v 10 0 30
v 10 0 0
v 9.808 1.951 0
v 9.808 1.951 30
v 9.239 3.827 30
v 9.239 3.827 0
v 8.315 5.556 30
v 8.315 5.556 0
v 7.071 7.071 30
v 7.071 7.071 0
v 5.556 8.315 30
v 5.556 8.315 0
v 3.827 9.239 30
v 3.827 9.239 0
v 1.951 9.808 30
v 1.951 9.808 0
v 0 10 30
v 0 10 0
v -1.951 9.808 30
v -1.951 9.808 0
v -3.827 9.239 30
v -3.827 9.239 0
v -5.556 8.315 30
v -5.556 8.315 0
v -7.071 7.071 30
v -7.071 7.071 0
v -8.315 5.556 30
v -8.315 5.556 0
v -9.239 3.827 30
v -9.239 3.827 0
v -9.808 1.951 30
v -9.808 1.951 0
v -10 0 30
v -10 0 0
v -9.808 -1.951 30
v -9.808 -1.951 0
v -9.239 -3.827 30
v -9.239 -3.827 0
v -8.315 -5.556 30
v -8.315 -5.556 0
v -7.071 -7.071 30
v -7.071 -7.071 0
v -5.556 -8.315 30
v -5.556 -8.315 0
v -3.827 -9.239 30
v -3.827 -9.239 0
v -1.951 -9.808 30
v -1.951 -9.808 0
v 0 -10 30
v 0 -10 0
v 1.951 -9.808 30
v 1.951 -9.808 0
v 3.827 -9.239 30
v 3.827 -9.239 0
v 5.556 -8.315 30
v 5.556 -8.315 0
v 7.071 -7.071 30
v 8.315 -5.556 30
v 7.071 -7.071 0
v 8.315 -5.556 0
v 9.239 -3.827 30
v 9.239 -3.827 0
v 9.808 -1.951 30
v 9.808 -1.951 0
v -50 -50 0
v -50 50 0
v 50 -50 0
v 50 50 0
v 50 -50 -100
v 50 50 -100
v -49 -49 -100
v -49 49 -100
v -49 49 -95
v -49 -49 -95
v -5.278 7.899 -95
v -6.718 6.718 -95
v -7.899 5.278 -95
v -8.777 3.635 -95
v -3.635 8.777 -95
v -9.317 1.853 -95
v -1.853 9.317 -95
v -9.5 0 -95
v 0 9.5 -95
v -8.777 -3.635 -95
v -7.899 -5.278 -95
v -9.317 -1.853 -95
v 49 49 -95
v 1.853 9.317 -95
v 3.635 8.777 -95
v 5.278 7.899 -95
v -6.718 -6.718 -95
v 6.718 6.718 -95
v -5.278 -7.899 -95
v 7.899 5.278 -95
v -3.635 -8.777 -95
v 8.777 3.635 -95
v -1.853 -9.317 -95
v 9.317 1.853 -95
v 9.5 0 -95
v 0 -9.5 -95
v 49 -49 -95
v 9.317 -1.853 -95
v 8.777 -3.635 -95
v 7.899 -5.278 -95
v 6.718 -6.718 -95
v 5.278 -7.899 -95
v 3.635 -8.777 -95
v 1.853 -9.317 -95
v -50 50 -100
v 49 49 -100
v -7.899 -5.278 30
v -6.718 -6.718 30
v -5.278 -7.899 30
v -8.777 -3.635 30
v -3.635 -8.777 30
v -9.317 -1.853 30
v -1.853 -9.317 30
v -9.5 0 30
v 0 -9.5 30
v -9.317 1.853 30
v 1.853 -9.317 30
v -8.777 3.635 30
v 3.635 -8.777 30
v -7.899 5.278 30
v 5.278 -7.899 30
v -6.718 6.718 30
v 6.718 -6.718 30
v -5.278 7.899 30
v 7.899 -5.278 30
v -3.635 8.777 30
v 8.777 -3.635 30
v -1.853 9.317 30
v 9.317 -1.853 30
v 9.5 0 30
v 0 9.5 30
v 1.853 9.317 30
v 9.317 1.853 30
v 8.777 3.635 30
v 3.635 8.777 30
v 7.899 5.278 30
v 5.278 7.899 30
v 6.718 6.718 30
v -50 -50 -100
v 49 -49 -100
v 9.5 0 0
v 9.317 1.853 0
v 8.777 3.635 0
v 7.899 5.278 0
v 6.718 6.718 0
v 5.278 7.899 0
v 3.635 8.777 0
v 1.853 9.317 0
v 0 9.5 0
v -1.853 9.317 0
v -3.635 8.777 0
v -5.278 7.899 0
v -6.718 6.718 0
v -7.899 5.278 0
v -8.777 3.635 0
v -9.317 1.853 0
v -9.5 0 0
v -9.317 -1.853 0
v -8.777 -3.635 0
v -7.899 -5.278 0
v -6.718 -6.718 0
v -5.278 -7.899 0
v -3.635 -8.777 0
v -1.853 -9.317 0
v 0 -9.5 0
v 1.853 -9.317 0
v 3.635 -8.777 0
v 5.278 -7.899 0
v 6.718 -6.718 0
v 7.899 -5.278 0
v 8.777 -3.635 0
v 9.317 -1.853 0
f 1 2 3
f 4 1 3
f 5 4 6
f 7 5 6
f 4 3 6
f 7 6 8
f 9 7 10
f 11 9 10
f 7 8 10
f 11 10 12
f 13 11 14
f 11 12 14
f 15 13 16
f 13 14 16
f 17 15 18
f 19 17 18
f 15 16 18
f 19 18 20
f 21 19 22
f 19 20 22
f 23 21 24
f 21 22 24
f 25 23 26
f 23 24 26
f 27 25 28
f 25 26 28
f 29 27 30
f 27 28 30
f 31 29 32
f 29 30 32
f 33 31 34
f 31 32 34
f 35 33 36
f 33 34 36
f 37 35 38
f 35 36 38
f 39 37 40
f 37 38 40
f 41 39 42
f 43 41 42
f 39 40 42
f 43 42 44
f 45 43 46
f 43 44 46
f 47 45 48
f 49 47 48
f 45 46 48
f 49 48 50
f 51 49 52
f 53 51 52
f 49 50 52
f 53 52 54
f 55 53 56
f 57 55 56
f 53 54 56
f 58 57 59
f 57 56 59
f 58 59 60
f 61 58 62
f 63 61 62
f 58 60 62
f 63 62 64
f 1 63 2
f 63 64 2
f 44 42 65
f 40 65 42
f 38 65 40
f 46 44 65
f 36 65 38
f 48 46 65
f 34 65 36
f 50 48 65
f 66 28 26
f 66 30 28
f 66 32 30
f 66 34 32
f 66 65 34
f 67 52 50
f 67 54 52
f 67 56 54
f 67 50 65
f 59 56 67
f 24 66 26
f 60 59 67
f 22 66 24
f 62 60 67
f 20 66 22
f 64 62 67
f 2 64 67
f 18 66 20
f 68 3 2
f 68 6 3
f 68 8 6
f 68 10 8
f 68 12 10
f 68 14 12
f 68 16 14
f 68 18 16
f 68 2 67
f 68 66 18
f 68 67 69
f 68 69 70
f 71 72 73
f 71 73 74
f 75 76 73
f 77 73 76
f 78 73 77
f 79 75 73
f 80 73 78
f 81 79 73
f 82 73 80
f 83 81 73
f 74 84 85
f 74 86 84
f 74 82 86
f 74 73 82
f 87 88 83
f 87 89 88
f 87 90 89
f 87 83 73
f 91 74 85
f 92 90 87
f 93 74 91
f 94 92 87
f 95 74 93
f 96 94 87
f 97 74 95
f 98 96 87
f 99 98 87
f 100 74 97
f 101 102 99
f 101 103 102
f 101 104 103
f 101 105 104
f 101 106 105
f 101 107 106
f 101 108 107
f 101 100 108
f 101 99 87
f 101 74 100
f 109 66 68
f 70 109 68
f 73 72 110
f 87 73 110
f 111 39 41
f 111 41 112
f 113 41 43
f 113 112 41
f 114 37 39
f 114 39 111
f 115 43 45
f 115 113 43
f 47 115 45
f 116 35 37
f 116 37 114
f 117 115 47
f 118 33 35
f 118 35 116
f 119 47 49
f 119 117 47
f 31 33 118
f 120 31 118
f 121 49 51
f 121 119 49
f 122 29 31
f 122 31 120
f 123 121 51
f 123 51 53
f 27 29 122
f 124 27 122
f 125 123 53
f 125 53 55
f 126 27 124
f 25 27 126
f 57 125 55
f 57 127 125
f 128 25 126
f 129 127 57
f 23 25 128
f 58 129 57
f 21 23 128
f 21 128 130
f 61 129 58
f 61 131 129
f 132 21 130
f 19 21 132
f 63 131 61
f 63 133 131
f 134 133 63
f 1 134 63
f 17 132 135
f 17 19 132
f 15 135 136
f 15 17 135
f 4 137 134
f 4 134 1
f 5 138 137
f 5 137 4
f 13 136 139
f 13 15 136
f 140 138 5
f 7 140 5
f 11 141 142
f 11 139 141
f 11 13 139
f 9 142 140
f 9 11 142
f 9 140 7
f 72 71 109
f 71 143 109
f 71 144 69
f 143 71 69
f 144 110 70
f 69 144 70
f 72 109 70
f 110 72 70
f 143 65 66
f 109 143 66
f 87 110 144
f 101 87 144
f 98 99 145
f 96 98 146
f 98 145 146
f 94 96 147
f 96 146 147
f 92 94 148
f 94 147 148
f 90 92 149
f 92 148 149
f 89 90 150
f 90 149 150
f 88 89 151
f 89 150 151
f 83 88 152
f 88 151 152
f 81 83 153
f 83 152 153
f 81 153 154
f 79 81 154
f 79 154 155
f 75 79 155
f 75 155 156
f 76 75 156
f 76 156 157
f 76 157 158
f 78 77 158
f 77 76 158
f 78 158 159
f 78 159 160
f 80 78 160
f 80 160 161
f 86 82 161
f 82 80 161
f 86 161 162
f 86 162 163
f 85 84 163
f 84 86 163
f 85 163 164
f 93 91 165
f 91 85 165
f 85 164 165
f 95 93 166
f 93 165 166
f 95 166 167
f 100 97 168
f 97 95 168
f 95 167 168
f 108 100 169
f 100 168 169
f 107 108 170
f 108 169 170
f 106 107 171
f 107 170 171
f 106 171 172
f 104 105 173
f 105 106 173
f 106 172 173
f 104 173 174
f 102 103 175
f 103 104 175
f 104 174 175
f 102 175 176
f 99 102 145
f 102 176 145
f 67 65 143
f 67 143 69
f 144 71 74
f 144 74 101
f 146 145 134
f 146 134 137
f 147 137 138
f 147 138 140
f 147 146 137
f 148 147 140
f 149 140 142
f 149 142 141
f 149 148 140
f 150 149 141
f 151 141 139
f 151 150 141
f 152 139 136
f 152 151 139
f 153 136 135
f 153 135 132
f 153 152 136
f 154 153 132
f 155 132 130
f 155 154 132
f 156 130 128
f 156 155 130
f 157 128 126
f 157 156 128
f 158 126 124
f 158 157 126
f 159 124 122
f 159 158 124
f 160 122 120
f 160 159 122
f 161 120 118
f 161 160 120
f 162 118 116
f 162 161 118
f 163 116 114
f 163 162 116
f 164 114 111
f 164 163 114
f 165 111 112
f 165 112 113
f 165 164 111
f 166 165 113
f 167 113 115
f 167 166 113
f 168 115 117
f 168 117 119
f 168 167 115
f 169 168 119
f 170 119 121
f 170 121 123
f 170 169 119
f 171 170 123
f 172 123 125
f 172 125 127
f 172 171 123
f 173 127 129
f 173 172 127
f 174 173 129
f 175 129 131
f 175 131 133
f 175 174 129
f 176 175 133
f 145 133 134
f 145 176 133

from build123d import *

# Parameters (mm, degrees)
F0_W     = 100
F0_H     = 100
F1_DEPTH = 100
F2_R     = 10
F2_R_2   = 9.5
F3_DEPTH = 30
F4_DEPTH = 100
F5_W     = 98
F5_H     = 98
F5_R     = 9.5
F6_DEPTH = 5


with BuildPart() as f1:
    # F0 (on Top) → F1 (new body)
    with BuildSketch(Plane.XY):
        Rectangle(F0_W, F0_H)
    extrude(amount=-F1_DEPTH)

    # F2 (on Top) → F3 (join)
    with BuildSketch(Plane.XY):
        Circle(F2_R)
        Circle(F2_R_2, mode=Mode.SUBTRACT)
    extrude(amount=F3_DEPTH)

    # F4 (cut, through all): a face of the model
    f4_faces = [f1.faces().sort_by_distance(p)[0] for p in [
        (0, 0, 0),
    ]]
    extrude(f4_faces, amount=-F4_DEPTH, mode=Mode.SUBTRACT)

    # F5 (on face) → F6 (cut)
    with BuildSketch(Plane(origin=(0, 0, -100), x_dir=(1, 0, 0), z_dir=(0, 0, -1))):
        Rectangle(F5_W, F5_H)
        Circle(F5_R, mode=Mode.SUBTRACT)
    extrude(amount=-F6_DEPTH, mode=Mode.SUBTRACT)


solid = f1.part
